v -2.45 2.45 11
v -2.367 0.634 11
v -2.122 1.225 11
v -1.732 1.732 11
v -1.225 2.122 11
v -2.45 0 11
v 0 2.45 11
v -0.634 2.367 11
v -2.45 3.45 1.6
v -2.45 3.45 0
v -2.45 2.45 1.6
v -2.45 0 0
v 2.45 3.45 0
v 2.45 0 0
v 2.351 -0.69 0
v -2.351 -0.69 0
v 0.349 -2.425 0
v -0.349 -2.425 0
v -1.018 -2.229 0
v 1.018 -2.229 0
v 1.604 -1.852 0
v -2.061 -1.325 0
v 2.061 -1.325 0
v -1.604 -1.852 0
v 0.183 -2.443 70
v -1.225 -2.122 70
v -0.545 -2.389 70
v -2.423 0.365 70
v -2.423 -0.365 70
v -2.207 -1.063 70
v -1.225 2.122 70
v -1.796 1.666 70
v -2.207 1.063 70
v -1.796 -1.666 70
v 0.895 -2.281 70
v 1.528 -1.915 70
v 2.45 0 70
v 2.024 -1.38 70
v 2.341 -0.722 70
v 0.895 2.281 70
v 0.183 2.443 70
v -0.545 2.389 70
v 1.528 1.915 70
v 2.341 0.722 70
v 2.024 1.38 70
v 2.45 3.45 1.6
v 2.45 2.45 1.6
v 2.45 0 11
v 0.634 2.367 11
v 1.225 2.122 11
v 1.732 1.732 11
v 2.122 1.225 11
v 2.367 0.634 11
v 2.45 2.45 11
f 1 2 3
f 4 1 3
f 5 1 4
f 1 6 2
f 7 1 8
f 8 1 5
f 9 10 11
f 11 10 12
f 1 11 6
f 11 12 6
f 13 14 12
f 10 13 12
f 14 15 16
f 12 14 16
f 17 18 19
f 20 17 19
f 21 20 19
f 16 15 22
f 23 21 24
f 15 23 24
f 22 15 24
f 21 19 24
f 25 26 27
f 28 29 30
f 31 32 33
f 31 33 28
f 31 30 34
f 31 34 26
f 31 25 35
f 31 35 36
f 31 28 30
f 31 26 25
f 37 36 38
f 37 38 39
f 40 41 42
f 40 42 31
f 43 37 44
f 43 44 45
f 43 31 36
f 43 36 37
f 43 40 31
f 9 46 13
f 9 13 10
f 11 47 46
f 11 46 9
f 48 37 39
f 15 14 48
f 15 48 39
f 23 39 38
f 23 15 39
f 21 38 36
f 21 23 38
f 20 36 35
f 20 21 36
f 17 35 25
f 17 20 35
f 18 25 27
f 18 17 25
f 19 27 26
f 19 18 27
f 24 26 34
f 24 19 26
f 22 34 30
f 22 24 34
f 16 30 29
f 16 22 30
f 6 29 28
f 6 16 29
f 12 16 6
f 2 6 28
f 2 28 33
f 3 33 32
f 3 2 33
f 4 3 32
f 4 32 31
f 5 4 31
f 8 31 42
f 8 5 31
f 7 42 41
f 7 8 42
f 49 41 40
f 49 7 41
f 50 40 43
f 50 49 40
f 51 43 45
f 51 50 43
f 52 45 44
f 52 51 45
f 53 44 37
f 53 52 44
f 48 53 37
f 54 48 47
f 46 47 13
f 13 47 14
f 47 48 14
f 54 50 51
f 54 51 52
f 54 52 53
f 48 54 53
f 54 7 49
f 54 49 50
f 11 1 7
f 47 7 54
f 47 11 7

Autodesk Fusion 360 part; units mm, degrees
sketch "Sketch1" plane through (0, 0, 0) normal (0, 0, 1) x (1, 0, 0)
  circle A0 centre (0, 0) radius 2.45
  dimension "d1" = 4.9
extrude "Extrude1" add sketch "Sketch1" along normal blind 70
sketch "Sketch2" plane through (0, 0, 0) normal (0, 0, 1) x (1, 0, 0)
  line L0 (0, 0) -> (2.45, 0)
  line L1 (2.45, 0) -> (-2.45, 0)
  line L2 (-2.45, 0) -> (-2.45, 2.45)
  line L3 (-2.45, 2.45) -> (2.45, 2.45)
  line L4 (2.45, 2.45) -> (2.45, 0)
  dimension "d4" = 2.45
  dimension "d5" = 4.9
  dimension "d6" = 2.45
extrude "Extrude2" add sketch "Sketch2" along normal blind 11
sketch "Sketch3" plane through (0, 2.45, 0) normal (0, 1, 0) x (-1, 0, 0)
  line L0 (0, 11) -> (-2.45, 11)
  line L1 (-2.45, 11) -> (-2.45, 0)
  line L2 (-2.45, 0) -> (2.45, 0)
  line L3 (2.45, 0) -> (2.45, 11)
  line L4 (2.45, 11) -> (0, 11)
  line L5 (2.45, 0) -> (-2.45, 0)
  line L6 (-2.45, 0) -> (-2.45, 1.6)
  line L7 (-2.45, 1.6) -> (2.45, 1.6)
  line L8 (2.45, 1.6) -> (2.45, 0)
  dimension "d9" = 1.6
extrude "Extrude3" add sketch "Sketch3" along normal blind 1 contours L1 L2 L3 L5 L6 L7 L8
sketch "Sketch4" plane through (0, 0, 0) normal (1, 0, 0) x (0, 0, -1)
  line L0 (0, 0) -> (0, -2.45)
  line L1 (0, -2.45) -> (-6.9, -2.45)
  line L2 (-6.9, -2.45) -> (-4.9, -2.45)
  line L3 (-5.9, -2.45) -> (-5.9, -1.825)
  line L4 (-5.9, -1.825) -> (-5.9, -1.325)
  line L5 (-5.9, -1.325) -> (-5.9, -1.2)
  line L6 (0, 0) -> (-0.3154, 0)
  line L7 (-0.3154, 0) -> (-5.9, 0)
  line L8 (-5.9, 0) -> (-2.9, 0)
  line L9 (-5.9, 0) -> (-8.9, 0)
  line L10 (-8.9, 0) -> (-2.9, 0) construction
  line L11 (-1.7, 0) -> (-10.1, 0)
  line L12 (-2.9, 1.575) -> (-8.9, 1.575)
  arc A0 (-8.9, 1.575) -> (-8.9, -1.575) centre (-8.9, 0) ccw
  line L13 (-8.9, -1.575) -> (-2.9, -1.575)
  arc A1 (-2.9, -1.575) -> (-2.9, 1.575) centre (-2.9, 0) ccw
  line L14 (-2.9, 0) -> (-8.9, 0) construction
  line L15 (-10.1, 0) -> (-10.475, 0)
  ellipse E0 centre (-5.9, -2.45) end of major axis (-6.9, -2.45) minor radius 0.5
  line L16 (-4.9, -2.45) -> (-6.9, -2.45) construction
  line L17 (-5.9, -1.95) -> (-5.9, -2.95) construction
  dimension "d12" = 2.45
  dimension "d13" = 6.9
  dimension "d14" = 2
  dimension "d16" = 0.5
  dimension "d17" = 3
  dimension "d18" = 3
  dimension "d29" = 1
extrude "Extrude4" [suppressed]
extrude "Extrude5" [suppressed]
sketch "Sketch5" plane through (0, 0, 70) normal (0, 0, 1) x (1, 0, 0)
  circle A0 centre (0, 0) radius 2.45
  circle A1 centre (0, 0) radius 1.5
extrude "Extrude6" [suppressed]
fillet "Fillet1" [suppressed]
chamfer "Chamfer1" [suppressed]
moveface "MoveFace1" [suppressed]
fillet "Fillet2" [suppressed]
fillet "Fillet3" [suppressed]
move_face "OffsetFaces1" [suppressed]
moveface "MoveFace2" [suppressed]
sketch "Sketch6" plane through (0, 0, 0) normal (0, 0, 1) x (1, 0, 0)
  circle A0 centre (0, 0) radius 2.45
  line L0 (0, 0) -> (0, -2.45)
  line L1 (0, -2.45) -> (0, -2.95)
  line L2 (0, -2.95) -> (-0.5, -2.95)
  line L3 (-0.5, -2.95) -> (-0.5, -2.3984)
  line L4 (-0.5, -2.3984) -> (0, -2.3984)
  line L5 (0, -2.3984) -> (0, -2.95)
  line L6 (-0.5, -2.95) -> (-0.2, -2.95)
  line L7 (-0.2, -2.95) -> (-1.5058, -1.9327)
  dimension "d30" = 4.9
  dimension "d31" = 0.5
  dimension "d32" = 0.5
  dimension "d33" = 0.3
move_body "Move2" [suppressed]
equation "d4 = ( 4.9 / 2 ) * 1 mm"
equation "d6 = ( 4.9 / 2 ) * 1 mm"
equation "d12 = ( 4.9 / 2 ) * 1 mm"
equation "d26 = ( 3 / 2 ) * 1 mm"
equation "d28 = ( ( 4.9 - 3 ) / 2 ) * 1 mm"
